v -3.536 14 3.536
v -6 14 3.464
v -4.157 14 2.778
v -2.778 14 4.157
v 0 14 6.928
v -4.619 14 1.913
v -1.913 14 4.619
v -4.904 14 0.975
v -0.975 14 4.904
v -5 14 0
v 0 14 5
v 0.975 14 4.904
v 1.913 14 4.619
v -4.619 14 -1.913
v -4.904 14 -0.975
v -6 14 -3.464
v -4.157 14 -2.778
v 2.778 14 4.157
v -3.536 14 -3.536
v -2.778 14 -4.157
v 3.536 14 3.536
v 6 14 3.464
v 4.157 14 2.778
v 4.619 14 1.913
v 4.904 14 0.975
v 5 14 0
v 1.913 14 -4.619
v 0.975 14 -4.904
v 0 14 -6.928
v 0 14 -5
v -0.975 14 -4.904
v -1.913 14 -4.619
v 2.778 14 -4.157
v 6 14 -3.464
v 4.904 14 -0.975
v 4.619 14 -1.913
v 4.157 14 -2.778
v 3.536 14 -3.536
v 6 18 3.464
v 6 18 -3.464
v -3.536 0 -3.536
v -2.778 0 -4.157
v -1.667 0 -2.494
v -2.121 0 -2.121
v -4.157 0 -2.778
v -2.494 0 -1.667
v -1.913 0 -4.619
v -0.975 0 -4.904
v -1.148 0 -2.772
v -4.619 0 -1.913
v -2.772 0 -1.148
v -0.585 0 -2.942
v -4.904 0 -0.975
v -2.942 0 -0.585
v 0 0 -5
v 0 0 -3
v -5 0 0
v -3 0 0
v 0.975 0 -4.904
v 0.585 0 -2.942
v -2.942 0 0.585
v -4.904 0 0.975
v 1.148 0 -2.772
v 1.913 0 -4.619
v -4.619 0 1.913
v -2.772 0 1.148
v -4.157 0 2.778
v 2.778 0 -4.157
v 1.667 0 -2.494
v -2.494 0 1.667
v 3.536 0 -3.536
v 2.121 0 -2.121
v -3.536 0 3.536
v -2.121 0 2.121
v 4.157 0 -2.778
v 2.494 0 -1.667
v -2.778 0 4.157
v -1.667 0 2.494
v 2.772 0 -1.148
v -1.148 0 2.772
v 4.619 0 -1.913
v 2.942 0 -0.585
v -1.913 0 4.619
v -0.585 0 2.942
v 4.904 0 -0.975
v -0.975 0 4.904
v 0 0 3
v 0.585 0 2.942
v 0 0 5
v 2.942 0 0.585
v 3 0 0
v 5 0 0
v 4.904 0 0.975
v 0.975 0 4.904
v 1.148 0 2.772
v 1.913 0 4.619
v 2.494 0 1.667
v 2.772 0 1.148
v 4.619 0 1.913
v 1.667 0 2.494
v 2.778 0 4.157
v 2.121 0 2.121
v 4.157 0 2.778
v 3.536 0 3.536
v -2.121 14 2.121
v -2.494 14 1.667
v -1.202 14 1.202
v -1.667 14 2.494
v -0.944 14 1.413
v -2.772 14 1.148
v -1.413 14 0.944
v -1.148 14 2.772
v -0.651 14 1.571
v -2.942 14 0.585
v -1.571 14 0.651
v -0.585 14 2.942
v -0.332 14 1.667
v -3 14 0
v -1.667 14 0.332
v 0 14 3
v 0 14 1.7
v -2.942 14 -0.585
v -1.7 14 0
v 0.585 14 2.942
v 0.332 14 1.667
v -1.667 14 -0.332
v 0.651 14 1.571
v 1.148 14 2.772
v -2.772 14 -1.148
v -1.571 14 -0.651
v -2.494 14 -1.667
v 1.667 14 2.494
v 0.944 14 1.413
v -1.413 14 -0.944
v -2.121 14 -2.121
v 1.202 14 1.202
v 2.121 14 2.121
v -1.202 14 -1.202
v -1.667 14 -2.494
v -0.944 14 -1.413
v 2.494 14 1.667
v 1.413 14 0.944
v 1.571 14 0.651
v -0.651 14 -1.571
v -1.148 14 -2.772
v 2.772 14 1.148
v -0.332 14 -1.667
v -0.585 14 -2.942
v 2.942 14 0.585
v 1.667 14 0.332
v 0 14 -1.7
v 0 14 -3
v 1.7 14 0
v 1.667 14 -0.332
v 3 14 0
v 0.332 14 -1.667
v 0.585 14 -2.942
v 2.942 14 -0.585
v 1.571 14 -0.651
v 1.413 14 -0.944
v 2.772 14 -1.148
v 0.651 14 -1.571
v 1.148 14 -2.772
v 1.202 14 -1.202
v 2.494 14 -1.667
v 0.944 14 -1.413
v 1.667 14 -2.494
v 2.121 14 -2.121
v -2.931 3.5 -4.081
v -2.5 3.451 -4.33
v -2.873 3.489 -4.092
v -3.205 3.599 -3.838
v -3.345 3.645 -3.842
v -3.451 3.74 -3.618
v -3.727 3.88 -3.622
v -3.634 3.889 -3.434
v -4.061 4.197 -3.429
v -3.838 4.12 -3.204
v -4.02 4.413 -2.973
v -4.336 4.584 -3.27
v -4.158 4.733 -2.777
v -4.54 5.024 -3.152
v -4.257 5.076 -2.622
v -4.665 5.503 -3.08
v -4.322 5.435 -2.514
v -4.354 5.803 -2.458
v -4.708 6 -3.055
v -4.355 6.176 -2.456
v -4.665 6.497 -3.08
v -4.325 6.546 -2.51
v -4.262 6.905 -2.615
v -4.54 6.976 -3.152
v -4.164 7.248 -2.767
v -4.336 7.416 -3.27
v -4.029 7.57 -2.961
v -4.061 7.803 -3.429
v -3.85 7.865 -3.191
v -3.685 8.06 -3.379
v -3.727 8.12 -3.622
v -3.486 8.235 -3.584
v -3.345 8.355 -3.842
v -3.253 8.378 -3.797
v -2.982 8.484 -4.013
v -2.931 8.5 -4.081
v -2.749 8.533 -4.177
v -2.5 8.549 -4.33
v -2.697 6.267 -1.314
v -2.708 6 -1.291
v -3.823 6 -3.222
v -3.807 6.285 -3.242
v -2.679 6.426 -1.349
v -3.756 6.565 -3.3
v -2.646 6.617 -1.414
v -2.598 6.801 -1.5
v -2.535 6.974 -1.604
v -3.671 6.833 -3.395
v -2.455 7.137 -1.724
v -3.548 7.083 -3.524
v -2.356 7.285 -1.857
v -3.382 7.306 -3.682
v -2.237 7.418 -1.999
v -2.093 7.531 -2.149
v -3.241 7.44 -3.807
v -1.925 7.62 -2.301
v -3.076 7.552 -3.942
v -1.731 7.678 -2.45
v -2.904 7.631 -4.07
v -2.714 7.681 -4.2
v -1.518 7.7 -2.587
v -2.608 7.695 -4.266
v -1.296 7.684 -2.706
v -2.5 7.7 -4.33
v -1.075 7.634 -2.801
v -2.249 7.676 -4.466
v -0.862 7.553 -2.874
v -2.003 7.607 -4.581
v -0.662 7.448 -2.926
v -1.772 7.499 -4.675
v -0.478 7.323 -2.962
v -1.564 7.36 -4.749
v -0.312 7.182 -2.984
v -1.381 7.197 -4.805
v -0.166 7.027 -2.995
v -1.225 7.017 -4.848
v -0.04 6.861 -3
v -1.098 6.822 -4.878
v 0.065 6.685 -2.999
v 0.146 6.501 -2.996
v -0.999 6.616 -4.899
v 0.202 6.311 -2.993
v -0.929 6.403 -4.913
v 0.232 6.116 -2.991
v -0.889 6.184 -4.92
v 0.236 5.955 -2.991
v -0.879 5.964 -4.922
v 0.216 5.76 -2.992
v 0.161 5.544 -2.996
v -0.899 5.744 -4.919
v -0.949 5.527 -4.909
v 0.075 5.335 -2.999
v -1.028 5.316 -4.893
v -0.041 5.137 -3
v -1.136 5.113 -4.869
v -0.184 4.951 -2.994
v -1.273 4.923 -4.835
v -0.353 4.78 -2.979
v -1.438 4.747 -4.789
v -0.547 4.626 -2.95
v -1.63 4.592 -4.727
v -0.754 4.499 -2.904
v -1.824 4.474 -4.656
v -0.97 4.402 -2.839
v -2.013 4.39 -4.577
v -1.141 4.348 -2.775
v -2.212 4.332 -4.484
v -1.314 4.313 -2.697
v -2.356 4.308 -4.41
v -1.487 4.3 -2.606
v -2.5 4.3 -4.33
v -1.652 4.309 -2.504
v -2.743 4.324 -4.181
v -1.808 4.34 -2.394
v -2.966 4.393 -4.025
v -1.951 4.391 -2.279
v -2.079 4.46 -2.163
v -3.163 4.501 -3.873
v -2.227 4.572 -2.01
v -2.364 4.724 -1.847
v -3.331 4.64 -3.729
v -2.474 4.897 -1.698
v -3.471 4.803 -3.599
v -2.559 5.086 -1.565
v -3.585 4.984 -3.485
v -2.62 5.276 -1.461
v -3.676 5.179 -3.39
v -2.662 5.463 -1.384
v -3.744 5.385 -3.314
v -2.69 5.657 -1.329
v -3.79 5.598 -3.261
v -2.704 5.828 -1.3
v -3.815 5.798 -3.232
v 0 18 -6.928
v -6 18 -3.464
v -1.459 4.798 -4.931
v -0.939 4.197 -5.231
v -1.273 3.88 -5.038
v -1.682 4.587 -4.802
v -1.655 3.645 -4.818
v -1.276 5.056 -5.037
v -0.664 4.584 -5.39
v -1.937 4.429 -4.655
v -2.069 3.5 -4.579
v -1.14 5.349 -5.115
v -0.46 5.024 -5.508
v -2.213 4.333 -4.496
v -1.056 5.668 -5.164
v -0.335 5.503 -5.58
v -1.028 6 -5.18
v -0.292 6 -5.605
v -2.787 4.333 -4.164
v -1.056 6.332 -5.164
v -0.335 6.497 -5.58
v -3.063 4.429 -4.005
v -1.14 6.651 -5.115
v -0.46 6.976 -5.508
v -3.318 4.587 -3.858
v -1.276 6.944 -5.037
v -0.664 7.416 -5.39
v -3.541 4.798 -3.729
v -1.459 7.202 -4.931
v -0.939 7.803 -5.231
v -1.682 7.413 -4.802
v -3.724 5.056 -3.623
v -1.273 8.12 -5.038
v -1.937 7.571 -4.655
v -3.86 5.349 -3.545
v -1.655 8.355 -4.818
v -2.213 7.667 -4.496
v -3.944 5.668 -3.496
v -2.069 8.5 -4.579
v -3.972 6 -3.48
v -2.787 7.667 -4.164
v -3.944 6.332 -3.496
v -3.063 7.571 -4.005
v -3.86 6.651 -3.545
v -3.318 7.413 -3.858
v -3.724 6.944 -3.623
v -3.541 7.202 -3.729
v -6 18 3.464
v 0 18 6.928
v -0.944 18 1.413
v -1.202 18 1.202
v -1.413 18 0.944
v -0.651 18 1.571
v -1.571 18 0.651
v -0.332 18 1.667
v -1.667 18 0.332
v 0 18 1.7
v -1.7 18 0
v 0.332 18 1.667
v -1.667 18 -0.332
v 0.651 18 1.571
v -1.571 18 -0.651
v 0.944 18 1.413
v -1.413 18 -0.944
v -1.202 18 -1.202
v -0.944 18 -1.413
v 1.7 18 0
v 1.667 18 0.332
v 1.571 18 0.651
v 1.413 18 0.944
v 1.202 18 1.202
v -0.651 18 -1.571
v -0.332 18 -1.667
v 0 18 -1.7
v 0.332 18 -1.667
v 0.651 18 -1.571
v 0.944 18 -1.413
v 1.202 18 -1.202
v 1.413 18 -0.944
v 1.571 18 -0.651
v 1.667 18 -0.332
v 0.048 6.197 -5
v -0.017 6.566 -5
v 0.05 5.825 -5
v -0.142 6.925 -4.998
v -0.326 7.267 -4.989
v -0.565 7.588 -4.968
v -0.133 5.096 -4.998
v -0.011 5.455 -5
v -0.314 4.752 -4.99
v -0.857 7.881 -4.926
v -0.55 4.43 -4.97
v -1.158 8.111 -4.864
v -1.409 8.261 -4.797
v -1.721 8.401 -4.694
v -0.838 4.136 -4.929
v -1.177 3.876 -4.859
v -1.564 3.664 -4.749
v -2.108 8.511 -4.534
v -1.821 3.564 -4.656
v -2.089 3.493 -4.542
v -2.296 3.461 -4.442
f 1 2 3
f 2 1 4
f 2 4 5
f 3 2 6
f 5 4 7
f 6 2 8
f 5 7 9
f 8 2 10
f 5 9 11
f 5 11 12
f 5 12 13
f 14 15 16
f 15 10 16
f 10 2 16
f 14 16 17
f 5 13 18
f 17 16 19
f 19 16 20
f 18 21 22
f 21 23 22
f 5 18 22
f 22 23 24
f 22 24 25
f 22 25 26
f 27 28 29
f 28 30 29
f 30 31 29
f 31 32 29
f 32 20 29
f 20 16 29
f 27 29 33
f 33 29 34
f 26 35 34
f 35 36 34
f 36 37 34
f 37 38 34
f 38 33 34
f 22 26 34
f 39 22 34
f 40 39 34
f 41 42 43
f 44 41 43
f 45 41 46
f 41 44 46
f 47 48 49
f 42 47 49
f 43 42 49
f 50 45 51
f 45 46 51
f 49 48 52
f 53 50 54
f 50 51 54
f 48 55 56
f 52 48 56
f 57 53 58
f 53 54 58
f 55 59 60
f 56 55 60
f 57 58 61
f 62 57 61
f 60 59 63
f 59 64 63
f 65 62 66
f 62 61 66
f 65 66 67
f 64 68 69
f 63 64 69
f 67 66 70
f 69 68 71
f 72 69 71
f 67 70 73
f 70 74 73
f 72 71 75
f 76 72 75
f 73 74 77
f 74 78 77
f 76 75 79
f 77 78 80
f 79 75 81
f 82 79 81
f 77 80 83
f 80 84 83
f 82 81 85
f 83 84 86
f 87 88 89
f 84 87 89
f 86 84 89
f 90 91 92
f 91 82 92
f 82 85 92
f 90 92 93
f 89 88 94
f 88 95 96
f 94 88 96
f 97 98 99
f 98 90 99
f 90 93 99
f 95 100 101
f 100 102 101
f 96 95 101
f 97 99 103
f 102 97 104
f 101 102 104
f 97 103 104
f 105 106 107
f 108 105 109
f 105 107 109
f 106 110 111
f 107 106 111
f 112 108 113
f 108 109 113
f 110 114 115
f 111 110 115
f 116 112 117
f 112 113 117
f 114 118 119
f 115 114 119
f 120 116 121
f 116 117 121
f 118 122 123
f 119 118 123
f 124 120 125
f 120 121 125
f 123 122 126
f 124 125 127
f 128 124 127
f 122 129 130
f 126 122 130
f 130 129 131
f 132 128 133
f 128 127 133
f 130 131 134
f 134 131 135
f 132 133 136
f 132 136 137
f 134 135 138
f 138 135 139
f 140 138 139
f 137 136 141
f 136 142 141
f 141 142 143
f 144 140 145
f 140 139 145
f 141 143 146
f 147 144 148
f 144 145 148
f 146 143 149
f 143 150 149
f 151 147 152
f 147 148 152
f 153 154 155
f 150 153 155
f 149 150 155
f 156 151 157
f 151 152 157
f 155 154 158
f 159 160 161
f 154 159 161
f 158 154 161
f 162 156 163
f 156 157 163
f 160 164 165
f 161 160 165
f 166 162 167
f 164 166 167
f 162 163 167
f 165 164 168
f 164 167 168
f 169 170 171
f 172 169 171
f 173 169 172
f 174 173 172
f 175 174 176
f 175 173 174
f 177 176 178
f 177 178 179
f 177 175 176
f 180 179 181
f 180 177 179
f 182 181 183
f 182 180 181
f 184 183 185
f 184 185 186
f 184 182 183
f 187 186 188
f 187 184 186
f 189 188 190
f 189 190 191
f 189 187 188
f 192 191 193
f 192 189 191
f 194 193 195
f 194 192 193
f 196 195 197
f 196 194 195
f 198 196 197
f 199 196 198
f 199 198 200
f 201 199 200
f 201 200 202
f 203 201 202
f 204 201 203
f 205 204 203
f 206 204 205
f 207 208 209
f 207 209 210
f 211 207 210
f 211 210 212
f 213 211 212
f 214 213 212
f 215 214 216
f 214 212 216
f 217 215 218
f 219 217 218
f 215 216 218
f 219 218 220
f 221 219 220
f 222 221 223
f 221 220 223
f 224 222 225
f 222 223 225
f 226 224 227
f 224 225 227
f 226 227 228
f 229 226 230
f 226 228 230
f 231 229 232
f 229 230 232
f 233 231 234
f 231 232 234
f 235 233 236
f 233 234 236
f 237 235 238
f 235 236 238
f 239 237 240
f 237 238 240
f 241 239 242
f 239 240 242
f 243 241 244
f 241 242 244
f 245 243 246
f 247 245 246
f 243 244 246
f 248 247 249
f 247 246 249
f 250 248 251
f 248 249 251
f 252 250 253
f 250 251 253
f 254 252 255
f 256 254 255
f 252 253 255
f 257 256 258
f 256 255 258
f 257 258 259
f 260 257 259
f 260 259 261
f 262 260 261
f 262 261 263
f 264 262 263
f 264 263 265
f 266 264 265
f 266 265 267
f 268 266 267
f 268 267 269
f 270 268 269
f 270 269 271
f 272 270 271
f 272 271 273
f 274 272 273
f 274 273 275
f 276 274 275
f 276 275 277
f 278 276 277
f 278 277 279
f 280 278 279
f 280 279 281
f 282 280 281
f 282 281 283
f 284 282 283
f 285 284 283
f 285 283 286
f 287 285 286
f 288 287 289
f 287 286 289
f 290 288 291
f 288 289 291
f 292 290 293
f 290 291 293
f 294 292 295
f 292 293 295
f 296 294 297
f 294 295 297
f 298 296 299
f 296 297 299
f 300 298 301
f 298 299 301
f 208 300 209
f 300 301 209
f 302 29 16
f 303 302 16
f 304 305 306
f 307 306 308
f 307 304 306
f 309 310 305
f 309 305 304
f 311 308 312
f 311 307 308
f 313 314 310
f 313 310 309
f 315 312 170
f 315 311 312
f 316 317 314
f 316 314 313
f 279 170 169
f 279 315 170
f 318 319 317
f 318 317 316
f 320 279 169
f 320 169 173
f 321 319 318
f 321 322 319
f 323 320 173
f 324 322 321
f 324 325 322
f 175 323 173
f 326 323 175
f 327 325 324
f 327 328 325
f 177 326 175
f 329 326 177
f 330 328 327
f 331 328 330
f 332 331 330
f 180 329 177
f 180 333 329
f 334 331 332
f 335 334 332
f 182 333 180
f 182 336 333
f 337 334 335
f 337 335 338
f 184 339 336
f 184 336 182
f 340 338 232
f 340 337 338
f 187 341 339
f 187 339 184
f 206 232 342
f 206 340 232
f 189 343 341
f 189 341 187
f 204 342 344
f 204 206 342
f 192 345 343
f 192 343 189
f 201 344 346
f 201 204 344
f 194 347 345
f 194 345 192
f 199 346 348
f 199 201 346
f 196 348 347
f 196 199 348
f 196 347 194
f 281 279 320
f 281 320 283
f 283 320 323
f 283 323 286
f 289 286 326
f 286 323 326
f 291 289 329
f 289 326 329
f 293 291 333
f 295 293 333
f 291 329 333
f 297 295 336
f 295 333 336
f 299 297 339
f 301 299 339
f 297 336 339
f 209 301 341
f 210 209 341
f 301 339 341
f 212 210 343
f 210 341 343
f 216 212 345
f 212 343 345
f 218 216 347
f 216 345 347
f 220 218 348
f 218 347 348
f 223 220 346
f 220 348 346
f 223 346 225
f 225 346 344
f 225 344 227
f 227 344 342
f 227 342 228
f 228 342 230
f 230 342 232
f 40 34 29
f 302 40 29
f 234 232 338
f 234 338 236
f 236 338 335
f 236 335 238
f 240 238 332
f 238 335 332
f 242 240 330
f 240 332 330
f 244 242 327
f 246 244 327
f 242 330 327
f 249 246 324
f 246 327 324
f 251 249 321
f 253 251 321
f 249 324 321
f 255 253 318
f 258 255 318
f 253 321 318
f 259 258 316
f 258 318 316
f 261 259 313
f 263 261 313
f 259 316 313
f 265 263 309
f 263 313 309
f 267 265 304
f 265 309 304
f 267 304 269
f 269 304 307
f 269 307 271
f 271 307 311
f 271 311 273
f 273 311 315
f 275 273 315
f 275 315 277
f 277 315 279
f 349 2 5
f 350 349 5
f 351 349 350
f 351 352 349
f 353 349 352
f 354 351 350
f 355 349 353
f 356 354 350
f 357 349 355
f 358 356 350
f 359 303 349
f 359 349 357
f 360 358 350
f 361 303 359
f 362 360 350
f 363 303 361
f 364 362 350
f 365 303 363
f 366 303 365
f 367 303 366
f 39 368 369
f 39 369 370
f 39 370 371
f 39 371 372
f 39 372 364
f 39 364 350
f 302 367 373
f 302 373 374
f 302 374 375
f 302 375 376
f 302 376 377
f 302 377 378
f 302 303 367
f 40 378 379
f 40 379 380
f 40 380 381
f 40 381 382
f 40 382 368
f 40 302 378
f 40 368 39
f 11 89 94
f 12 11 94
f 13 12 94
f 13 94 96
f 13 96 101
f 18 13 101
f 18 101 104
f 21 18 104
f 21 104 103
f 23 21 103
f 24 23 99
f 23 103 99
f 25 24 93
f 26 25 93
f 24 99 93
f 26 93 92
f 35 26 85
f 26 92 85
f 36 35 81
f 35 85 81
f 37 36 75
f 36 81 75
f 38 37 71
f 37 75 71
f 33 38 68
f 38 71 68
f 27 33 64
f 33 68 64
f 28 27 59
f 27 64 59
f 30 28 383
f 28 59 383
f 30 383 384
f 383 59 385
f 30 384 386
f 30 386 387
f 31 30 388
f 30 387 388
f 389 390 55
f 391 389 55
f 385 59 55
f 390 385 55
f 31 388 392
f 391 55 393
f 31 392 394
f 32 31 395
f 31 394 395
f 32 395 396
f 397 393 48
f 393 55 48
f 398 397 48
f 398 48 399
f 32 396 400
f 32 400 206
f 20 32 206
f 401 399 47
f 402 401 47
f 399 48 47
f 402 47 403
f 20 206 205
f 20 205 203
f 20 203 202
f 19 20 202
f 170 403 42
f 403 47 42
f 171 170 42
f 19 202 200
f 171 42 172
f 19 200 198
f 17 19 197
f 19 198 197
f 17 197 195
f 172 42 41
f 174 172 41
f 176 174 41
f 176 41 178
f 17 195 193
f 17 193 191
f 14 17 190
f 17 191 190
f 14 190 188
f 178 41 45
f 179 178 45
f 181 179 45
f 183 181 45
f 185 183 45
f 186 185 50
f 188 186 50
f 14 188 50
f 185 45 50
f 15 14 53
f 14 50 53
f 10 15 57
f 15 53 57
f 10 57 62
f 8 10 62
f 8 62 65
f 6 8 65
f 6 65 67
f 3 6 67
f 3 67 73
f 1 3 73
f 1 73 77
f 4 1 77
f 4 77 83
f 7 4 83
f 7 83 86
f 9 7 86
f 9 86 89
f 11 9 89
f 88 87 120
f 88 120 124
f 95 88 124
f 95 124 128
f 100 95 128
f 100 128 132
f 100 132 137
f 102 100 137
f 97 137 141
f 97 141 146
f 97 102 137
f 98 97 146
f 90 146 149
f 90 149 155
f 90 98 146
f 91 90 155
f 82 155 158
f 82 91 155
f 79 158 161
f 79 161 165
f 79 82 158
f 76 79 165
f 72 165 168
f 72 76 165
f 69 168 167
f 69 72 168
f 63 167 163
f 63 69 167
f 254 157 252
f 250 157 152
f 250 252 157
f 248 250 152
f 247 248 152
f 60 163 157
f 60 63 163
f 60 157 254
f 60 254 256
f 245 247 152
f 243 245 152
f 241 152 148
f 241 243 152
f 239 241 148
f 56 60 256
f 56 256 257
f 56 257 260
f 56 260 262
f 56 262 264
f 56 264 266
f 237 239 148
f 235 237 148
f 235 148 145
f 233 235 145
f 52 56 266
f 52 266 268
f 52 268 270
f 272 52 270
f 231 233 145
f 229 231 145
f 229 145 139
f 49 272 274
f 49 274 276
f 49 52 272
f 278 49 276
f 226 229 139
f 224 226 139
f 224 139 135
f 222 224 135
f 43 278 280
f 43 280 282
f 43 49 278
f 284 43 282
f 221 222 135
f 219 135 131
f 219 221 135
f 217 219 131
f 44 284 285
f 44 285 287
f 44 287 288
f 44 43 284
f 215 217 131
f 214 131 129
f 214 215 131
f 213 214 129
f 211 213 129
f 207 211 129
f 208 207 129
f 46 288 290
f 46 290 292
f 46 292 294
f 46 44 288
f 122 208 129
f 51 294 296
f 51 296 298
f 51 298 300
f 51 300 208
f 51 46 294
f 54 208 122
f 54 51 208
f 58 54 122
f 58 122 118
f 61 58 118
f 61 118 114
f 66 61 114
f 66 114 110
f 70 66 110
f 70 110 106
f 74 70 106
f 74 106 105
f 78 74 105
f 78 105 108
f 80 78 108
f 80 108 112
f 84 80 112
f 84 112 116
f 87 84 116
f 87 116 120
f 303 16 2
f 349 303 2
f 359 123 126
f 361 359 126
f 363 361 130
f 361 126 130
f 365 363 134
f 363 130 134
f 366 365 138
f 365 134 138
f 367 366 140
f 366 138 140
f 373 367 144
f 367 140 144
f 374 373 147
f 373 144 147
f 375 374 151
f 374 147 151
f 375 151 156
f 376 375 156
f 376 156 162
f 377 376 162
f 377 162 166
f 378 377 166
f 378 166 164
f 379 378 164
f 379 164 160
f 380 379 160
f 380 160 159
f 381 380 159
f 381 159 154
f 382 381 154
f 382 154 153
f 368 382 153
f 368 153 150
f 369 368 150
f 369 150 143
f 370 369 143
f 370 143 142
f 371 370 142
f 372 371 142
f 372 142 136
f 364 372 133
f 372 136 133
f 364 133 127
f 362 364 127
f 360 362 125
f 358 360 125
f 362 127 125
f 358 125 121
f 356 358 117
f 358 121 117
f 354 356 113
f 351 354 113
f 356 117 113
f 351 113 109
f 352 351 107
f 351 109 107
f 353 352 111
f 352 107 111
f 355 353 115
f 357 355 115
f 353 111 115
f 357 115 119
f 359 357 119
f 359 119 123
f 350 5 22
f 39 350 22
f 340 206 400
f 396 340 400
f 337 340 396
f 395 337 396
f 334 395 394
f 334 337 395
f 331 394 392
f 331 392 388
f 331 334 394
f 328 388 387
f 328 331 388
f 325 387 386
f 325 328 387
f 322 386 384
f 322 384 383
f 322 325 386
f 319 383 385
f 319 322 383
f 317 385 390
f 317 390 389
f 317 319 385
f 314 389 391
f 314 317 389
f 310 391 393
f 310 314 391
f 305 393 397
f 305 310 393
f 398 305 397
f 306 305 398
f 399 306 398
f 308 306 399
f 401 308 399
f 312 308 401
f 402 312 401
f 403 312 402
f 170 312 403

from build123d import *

# Parameters (mm, degrees)
SKETCH1_R                 = 5
SKETCH1_R_2               = 3
BOSS_EXTRUDE1_DEPTH       = 14
BOSS_EXTRUDE2_DEPTH       = 4
M3_CLEARANCE_HOLE1_D      = 3.4
M3_CLEARANCE_HOLE2_REACH  = 25.495
M3_CLEARANCE_HOLE2_BORE_R = 1.7
BOSS_EXTRUDE3_REACH       = 25.495
BOSS_EXTRUDE3_END_RADIUS  = 5
SKETCH11_R                = 2.549362178
SKETCH11_R_2              = 1.7
SKETCH14_R                = 2.549362178
CUT_EXTRUDE2_DEPTH        = 1


with BuildPart() as part:
    # Sketch1 → Boss-Extrude1 (new body)
    with BuildSketch(Plane(origin=(0, 0, 0), x_dir=(1, 0, 0), z_dir=(0, 1, 0))):
        with Locations(Location((0, 0, 0), (0, 0, 270))):
            Circle(SKETCH1_R)
        with Locations(Location((0, 0, 0), (0, 0, 270))):
            Circle(SKETCH1_R_2, mode=Mode.SUBTRACT)
    extrude(amount=BOSS_EXTRUDE1_DEPTH)

    # Sketch2 → Boss-Extrude2 (add)
    with BuildSketch(Plane(origin=(0, 14, 0), x_dir=(1, 0, 0), z_dir=(0, 1, 0))):
        Polygon((0, 6.92820323), (-6, 3.464101615), (-6, -3.464101615), (0, -6.92820323), (6, -3.464101615), (6, 3.464101615), align=None)
    extrude(amount=BOSS_EXTRUDE2_DEPTH)

    # M3 Clearance Hole1 (through all)
    with Locations(Plane(origin=(0, 18, 0), x_dir=(1, 0, 0), z_dir=(0, 1, 0))):
        with Locations((0, 0)):
            Hole(M3_CLEARANCE_HOLE1_D / 2)

    # M3 Clearance Hole2 bore → M3 Clearance Hole2 (cut, up to next)
    with BuildSketch(Plane(origin=(-3, 0, -5.196152423), x_dir=(-0.8660254037844386, 0, 0.5000000000000003), z_dir=(-0.5000000000000002, 0, -0.8660254037844385)), mode=Mode.PRIVATE) as m3_clearance_hole2_sk1:
        with Locations((0, 6)):
            Circle(M3_CLEARANCE_HOLE2_BORE_R)
    m3_clearance_hole2_tool1 = extrude(m3_clearance_hole2_sk1.sketch, amount=-M3_CLEARANCE_HOLE2_REACH, mode=Mode.PRIVATE) & part.part
    add(m3_clearance_hole2_tool1.solids().sort_by_distance((-3, 6, -5.196152))[0], mode=Mode.SUBTRACT)

    # Boss-Extrude3: up to this cylinder (the profile starts outside it)
    boss_extrude3_end = Plane(origin=(0, 6, 0), z_dir=(0, -1, 0)) * Cylinder(BOSS_EXTRUDE3_END_RADIUS, 61.99, mode=Mode.PRIVATE)
    # Sketch11 → Boss-Extrude3 (add, up to the surface)
    with BuildSketch(Plane(origin=(-3, 0, -5.196152423), x_dir=(-0.8660254037844386, 0, 0.5000000000000003), z_dir=(-0.5000000000000002, 0, -0.8660254037844385)), mode=Mode.PRIVATE) as boss_extrude3_sk1:
        with Locations((0, 6)):
            Circle(SKETCH11_R)
        with Locations((0, 6)):
            Circle(SKETCH11_R_2, mode=Mode.SUBTRACT)
    boss_extrude3_tool1 = extrude(boss_extrude3_sk1.sketch, amount=-BOSS_EXTRUDE3_REACH, mode=Mode.PRIVATE) - boss_extrude3_end
    add(boss_extrude3_tool1.solids().sort_by_distance((-0.854634, 6, -6.43478))[0])

    # Sketch14 → Cut-Extrude2 (cut)
    with BuildSketch(Plane(origin=(-3, 0, -5.196152423), x_dir=(-0.8660254037844384, 0, 0.5000000000000004), z_dir=(-0.5000000000000004, 0, -0.8660254037844384))):
        with Locations((0, 6)):
            Circle(SKETCH14_R)
    extrude(amount=-CUT_EXTRUDE2_DEPTH, mode=Mode.SUBTRACT)


solid = part.part
